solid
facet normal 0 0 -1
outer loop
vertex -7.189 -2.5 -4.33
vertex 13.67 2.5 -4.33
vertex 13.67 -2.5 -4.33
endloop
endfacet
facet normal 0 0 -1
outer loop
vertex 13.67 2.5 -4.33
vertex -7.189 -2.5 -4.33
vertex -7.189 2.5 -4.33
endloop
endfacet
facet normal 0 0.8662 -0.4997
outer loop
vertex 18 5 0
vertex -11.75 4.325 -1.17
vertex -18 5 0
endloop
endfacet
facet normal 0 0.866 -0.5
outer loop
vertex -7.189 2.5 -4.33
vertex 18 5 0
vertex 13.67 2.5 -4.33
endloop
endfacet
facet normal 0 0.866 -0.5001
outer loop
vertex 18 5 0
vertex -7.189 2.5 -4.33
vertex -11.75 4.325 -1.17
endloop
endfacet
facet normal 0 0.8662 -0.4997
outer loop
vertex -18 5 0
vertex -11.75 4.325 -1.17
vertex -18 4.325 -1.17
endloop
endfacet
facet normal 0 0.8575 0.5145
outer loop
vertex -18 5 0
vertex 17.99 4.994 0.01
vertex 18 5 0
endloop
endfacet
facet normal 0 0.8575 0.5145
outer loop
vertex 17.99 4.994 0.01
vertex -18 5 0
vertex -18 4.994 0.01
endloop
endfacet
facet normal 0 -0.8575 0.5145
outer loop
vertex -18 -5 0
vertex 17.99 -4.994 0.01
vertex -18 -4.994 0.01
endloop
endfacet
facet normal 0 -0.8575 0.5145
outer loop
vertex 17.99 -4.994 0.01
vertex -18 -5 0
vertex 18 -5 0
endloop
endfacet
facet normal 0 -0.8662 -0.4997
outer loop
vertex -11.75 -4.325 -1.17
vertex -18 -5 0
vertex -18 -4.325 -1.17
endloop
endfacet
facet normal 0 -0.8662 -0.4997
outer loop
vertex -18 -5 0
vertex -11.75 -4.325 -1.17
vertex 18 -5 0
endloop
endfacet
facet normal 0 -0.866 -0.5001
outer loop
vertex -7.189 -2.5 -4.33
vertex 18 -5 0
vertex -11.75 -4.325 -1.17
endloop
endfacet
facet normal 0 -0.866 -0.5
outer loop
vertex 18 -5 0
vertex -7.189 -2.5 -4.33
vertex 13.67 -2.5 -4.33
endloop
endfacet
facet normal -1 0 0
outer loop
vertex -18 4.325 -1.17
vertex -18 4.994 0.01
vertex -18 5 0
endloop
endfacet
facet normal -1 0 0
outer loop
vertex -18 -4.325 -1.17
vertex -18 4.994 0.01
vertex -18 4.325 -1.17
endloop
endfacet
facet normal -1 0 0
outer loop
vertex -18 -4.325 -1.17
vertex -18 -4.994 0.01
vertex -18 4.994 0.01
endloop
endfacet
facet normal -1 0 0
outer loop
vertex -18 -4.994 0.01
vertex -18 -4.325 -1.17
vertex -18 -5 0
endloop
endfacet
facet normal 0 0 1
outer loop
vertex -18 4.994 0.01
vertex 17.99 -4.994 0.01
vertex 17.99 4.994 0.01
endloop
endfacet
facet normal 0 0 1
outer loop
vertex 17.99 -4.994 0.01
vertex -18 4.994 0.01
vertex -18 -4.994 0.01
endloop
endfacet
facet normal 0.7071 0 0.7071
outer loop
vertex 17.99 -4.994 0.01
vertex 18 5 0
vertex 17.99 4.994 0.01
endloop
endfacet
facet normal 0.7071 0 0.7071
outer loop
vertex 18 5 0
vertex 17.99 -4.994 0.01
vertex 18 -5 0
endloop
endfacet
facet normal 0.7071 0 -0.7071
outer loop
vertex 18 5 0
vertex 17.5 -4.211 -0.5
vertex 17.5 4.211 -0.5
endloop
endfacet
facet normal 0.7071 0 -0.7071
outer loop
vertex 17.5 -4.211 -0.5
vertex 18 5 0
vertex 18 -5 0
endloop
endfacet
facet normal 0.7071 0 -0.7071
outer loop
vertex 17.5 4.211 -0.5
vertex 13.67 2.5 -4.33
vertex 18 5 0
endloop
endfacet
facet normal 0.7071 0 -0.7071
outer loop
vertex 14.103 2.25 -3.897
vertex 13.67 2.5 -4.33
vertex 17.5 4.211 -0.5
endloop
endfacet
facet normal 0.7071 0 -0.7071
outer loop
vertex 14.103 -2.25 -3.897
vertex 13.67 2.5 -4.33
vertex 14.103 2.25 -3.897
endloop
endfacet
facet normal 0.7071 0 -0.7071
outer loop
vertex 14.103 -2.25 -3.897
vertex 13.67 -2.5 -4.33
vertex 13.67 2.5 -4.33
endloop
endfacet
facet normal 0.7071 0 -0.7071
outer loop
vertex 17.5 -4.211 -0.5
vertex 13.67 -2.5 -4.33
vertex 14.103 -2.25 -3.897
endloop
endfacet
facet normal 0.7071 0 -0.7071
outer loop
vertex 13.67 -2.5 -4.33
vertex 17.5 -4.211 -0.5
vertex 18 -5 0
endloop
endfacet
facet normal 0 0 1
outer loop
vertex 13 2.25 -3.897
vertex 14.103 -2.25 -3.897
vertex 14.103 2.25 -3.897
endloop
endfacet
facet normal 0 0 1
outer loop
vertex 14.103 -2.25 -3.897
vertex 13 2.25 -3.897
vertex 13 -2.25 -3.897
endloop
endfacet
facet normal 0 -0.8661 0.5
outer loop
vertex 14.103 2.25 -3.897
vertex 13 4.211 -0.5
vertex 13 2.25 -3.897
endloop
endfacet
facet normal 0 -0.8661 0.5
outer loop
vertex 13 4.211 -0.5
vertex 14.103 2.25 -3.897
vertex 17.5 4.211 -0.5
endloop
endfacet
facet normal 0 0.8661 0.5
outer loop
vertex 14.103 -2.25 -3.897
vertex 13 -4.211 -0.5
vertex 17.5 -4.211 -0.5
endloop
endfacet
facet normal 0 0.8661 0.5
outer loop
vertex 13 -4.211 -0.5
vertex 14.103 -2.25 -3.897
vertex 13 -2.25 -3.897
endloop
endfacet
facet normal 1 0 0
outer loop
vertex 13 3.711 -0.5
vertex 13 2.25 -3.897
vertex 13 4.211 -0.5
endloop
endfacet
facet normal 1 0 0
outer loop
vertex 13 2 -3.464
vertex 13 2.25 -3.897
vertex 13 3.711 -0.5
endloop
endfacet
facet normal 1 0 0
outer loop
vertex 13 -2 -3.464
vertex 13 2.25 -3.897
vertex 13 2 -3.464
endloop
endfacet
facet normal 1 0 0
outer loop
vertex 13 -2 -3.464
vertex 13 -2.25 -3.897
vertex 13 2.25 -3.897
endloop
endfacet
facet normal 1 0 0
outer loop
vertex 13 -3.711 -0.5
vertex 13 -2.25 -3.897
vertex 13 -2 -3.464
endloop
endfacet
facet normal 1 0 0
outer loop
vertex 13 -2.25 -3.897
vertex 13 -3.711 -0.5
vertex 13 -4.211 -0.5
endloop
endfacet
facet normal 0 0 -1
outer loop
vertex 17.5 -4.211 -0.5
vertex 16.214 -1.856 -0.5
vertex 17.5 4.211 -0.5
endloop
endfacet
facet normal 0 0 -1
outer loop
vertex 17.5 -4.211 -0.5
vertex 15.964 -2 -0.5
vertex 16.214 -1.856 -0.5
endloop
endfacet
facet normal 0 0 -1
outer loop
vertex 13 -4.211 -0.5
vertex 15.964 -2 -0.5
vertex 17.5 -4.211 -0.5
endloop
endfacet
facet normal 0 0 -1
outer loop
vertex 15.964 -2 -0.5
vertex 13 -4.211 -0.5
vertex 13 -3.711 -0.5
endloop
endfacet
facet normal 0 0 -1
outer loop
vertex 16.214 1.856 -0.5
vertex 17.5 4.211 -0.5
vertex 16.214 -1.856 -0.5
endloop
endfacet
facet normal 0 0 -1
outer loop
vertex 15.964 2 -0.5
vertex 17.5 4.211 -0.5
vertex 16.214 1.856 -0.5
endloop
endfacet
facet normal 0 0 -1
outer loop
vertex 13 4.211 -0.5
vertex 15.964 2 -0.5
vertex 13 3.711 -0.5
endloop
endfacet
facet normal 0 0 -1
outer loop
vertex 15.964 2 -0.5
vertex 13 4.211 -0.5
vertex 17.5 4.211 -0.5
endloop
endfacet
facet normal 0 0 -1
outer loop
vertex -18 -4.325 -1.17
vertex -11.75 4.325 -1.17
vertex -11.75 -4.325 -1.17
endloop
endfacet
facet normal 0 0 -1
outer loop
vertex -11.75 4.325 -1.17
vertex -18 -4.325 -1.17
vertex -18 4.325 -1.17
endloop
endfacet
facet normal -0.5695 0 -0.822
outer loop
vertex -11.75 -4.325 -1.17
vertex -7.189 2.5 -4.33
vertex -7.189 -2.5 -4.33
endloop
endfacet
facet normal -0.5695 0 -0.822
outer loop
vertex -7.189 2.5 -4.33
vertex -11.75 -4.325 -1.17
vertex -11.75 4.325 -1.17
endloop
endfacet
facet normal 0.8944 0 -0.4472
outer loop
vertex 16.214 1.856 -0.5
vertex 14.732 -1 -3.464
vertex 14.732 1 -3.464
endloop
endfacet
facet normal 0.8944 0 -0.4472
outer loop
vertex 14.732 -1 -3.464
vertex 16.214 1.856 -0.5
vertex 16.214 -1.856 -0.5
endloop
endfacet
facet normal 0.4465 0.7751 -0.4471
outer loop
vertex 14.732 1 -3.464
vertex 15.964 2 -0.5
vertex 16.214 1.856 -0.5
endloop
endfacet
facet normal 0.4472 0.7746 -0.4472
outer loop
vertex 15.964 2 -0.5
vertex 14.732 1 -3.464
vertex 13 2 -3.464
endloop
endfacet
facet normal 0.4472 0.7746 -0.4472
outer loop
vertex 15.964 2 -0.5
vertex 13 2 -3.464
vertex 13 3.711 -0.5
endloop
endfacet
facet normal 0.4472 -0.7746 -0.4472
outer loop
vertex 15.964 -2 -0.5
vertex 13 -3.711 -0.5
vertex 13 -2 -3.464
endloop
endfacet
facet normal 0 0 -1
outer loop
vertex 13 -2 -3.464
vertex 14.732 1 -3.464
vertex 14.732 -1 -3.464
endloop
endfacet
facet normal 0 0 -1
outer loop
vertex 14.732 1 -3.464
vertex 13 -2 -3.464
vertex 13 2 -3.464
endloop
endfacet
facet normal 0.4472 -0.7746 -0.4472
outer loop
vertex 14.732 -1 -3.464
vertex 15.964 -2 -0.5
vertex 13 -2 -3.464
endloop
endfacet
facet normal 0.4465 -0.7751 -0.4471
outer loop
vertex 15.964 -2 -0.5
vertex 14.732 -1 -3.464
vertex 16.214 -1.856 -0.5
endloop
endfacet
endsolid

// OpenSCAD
// file: disk0.scad
use <../lib/util.scad>
include <common.scad>
use <disks.scad>

module disk_point_5_plus() {
    translate([0,0,disk_0_deck_h])
    cylinder(d1=(disk_0_upper_d+4*disk_0_deck_h), d2=disk_0_upper_d, h=disk_0_deck_h*2, center=true, $fn=faces_convex);

    linear_extrude(convexity=10, height=2*disk_0_deck_h, scale=[1,(disk_0_upper_d/ (disk_0_upper_d+4*disk_0_deck_h))])
    translate([-disk_0_width/4,0,0])
    square([disk_0_width/2, disk_0_upper_d+4*disk_0_deck_h], center=true);
    
    util_mirrored([0,1,0])
    translate([-disk_0_width/2, disk_0_upper_d/2 + disk_0_deck_h/2, disk_0_deck_h/2+.5])
    sphere(d=.8*disk_0_deck_h, $fn=faces_convex);
}

module disk_0_plus() {
    translate([0,0,disk_0_deck_h/2])
    cylinder(d1=disk_0_width, d2=(disk_0_width-2*disk_0_deck_h), h=disk_0_deck_h, center=true, $fn=faces_convex);

    disk_point_5_plus();
}

module disk_0_under() {
    difference() {
        translate([0,0,-disk_0_deck_h])
        cylinder(d2=(disk_0_upper_d+4*disk_0_deck_h), d1=disk_0_upper_d, h=disk_0_deck_h*2, center=true, $fn=faces_convex);
        
        translate([0,0,-2*disk_0_deck_h])
        cylinder(d2=disk_0_upper_d-2, d1=disk_0_upper_d, h=.5, center=true, $fn=faces_convex);
        
        util_repeat_rot(7, [0,0,45])
        translate([disk_0_upper_d/2+disk_0_deck_h,0,-disk_0_deck_h*.5]) porthole();
        
        util_repeat_rot(3, [0,0,90])
        translate([disk_0_upper_d/2,0,-disk_0_deck_h*1.5]) porthole();
    }
}

module disk_0_under_2() {
    difference() {
        translate([0,0,-disk_0_deck_h])
        cylinder(d2=disk_0_width, d1=(disk_0_width-4*disk_0_deck_h), h=disk_0_deck_h*2, center=true, $fn=faces_convex);
        
        translate([0,0,-2*disk_0_deck_h])
        cylinder(d2=disk_0_upper_d-2, d1=disk_0_upper_d, h=.5, center=true, $fn=faces_convex);
    }
}

module disk_point_5_minus() {
    translate([-disk_0_width/2,0,disk_0_deck_h])
    cube([.5, disk_0_upper_d-1, 2*disk_0_deck_h-1], center=true);
    
    util_mirrored([0,1,0])
    translate([-disk_0_width/2-.4*disk_0_deck_h, disk_0_upper_d/2 + disk_0_deck_h/2, disk_0_deck_h/2+.5])
    sphere(d=.6*disk_0_deck_h, $fn=faces_convex);
    
    translate([disk_0_upper_d/2+disk_0_deck_h/4, 0, disk_0_deck_h*1.5])
    scale([1,2,1])
    window();
    
    util_mirrored([0,1,0])
    util_repeat(3, [-4,0,0])
    rotate(90)
    translate([disk_0_upper_d/2+disk_0_deck_h/2, 0, disk_0_deck_h*1.5])
    porthole();
}

module disk_0_minus() {
    translate([0,0,2*disk_0_deck_h])
    cylinder(d1=disk_0_upper_d-2, d2=disk_0_upper_d, h=.5, center=true, $fn=faces_convex);
    
    disk_point_5_minus();
    
    util_mirrored([0,1,0])
    util_repeat_rot(6, [0,0,22])
    translate([disk_0_width/2-disk_0_deck_h/2,0, disk_0_deck_h*.5])
    porthole();
}

module disk_0() {
    difference() {
        disk_0_plus();
        disk_0_minus();
    }
}


module disk_point_5() {
    difference() {
        disk_point_5_plus();
        disk_point_5_minus();
    }
}

disk_0();
// file: disks.scad
use <../lib/util.scad>
include <common.scad>

module window() {
    translate([2,0,0])
    cube([5, 2, 1], center=true);
}

module porthole() {
    translate([2,0,0])
    rotate([0,90,0])
    cylinder(d=.75, h=5, center=true, $fn=12);
}
// file: common.scad
faces_convex=64;
faces_concave=128;
faces_rough=32;

disk_0_width=36;
disk_0_deck_h=2.5;
disk_0_upper_d=12;

disk_1_width=100;
disk_1_height=15;

class_0_nacelles_w=5;
class_0_nacelles_l=36;

class_0_secondary_w=10;
class_0_secondary_l=36;

class_0_hangar_l=50;

class_1_nacelle_w=9;
class_1_nacelle_l=115;

class_1_neck_w=10;
class_1_neck_w_2=1;

class_1_secondary_w=25;
class_1_secondary_l=100;

disk_2_width=240;
disk_2_height=30;
disk_2_deck=3;

class_2_nacelle_w=25;
class_2_nacelle_h=25;
class_2_nacelle_l=320;

class_2_secondary_w=60;
class_2_secondary_l=240;

disk_3_width=400;
disk_3_height=40;
disk_3_body_width=180;

class_3_secondary_w=80;
class_3_secondary_h=80;
class_3_secondary_l=400;

disk_4_width=750;
disk_4_upper=480;
disk_4_height=50;
disk_4_hangar_h=50;
disk_4_hangar_w=100;
disk_4_hangar_l=100;

class_3_nacelle_w=36;
class_3_nacelle_h=36;
class_3_nacelle_l=400;

class_4_body_w=750;
class_4_body_h=100;
class_4_body_h_extra=50;
class_4_body_curve=100;
class_4_body_upper_curve=10;
class_4_body_inner_curve=5;
class_4_body_wall=5;
class_4_body_height=135;
class_4_body_l=500;
class_4_body_hangar=100;
class_4_body_hangar_w=100;

class_4_nacelle_sep=145;
class_4_nacelle_disp=360;
class_4_nacelle_base_w=20;
class_4_nacelle_disp_ratio=1;

class_4_neck_curve=200;

class_4_hangar_h=90;
class_4_hangar_w=180;

class_4_nacelle_l=800;
class_4_nacelle_w=36;
class_4_nacelle_h=72;
// file: ../lib/util.scad
fn1 = 32;
fn2 = 16;

module util_half_sphere(radius, fn=fn1) {
    difference() {
        sphere(radius, $fn=fn);
        translate([0,0,-(radius+radius/19)])
            cube(2*radius+radius/10, center=true);
    }
}

function gcd(a,b) = a == b ? a : a > b ? gcd(a-b, b) : gcd(a, b-a);

module util_saucer(length, width, height, fn=fn1) {
    rad = gcd(length,gcd(width,height));
    //rad = 10;
    scale([length/(2*rad), width/(2*rad), height/rad])
        util_half_sphere(rad, fn);
}

module util_half_cylinder(length, radius, inner_fn=fn2, outer_fn=fn1) {
    maxval = max(length, 2*radius);
    intersection() {
        difference() {
            rotate([0,90,0])
                translate([0,0,-(length/2 + length/20)])
                    cylinder(length+length/10, radius, radius, $fn=inner_fn);
            
            translate([0,0,(maxval/2 + maxval/19)])
                cube(maxval+maxval/10, center=true);
        }
        
        translate([0,0,-(radius+radius/20)])
            cylinder(radius + radius/10, length/2, length/2, $fn=outer_fn);
    }
}

module util_body(length, width, height, upper_height, fn=fn1) {
    rad = gcd(length, gcd(width, upper_height));
    
    scale(.995) scale([length/(2*rad), width/(2*rad), 1])
        util_half_cylinder(2*rad, height, outer_fn=fn);
}

module util_graded_cylinder(height, radius_start, radius_end, grades=1, fn=fn1) {
    height_grade = height / grades;
    radius_grade = (radius_start - radius_end) / (grades * grades);
    for (i = [0 : 1 : grades]) {
        translate([0,0,i*height_grade])
            cylinder(height_grade, 
                     radius_start - i*radius_grade * i,
                     radius_start - (i+1) * radius_grade * (i+1),
                     $fn = fn);
    }
}

module util_nacelle(length, width, height, curved=false, up=true, front_bulge=false) {
    rad = min(width, height/2);
    grads = curved ? 6 : 1;
    scale_factor = front_bulge ? 1.1 : 1;
    direction = up ? -1 : 1;
    difference() {
        scale([1, width/ (2*rad), height/rad])
            difference() {
                union() {
                    rotate([0,-90,0])
                        rotate(30)
                            util_graded_cylinder(length-rad, rad, rad/2, grads, 6);
                    scale(scale_factor) 
                        rotate([0,90,0]) rotate(90) sphere(rad, $fn=6);
                }
                
                translate([-length/2, 0, direction * (height/2 + height/19)])
                    cube([length+length, width+width, height+height/10], center=true);
            }
        
        translate([-length-(curved?length/3:0), 0, -length/3])
            rotate([0,-45,0])
                cube(length, center=true);
    }
}

module util_mirrored(v) {
    children();
    mirror(v) children();
}

module util_ring(outer, inner, height, fn=fn1) {
    difference() {
        translate([0,0,-height/2])
            cylinder(height, outer, outer, $fn=fn);
        translate([0,0,-(height/2 + height/19)])
            cylinder(height+height/10, inner, inner, $fn=fn);
    }
}

module util_star(radius, thick, num, half=false) {
    angle = 360/num;
    offset = half? angle/2 : 0;
    for (i = [0: 1: num]) {
        rotate(i* angle + offset)
            translate([radius/2,0,0])
                cube([radius, thick, thick], center=true);
    }
}

module util_ring_star(radius, thick, num, inner, half=false) {
    outer=inner+thick;
    avg = (inner + outer)/2;
    union() {
        difference() {
            util_star(radius, thick, num, half);
            cylinder(2*thick, outer, outer, $fn=num, center=true);
        }
        util_ring(outer, inner, thick);
    }
}

module util_hangar_disk(height, lower, upper, num, fn=fn1) {
    difference() {
            cylinder(height, lower, upper, $fn=fn, center=true);
        difference() {
            scale([1,1,22])
                util_star(1.1*upper, height/20, num, half=true);
            scale(.95)
                cylinder(height, lower, upper, $fn=fn, center=true);
        }
    }
}

module util_hangar_form(length, width, height, num, inner=0) {
    l = 0.6* max(length, width);
    h = 2.5* height;
    thick = min(height/20,1);
    inner = inner == 0 ? l/3 : inner;
    difference() {
        children();
        scale([1,1,h/thick]) 
            util_ring_star(l, thick, num, inner, half=true);
    }
    scale(.95) children();
}

module util_nacelle_bar(span, height, width, thickness, faces=fn1) {
    rad = (span*span/(8*height) + height/2);
    outer = rad + thickness/2;
    inner = rad - thickness/2;
    difference(){
        translate([0,0,outer])
            rotate([0,90,0])
                util_ring(outer, inner, width, fn=faces);
    
        translate([0,0,1.1*outer+height])
            cube(2.2*outer, center=true);
    }
}

module util_q_sphere(rad, quadrant, faces) {
    x_sign = quadrant == 1 ? 1 :
             quadrant == 2 ? -1 :
             quadrant == 3 ? -1 :
             quadrant == 4 ? 1 : 0;
    z_sign = quadrant == 1 ? 1 :
             quadrant == 2 ? 1 :
             quadrant == 3 ? -1 :
             quadrant == 4 ? -1 : 0;
    
    difference() {
        sphere(rad, $fn=faces);

        translate([x_sign*(-1.1*rad - .01),0,0])
        cube(2.2*rad, center=true);

        translate([0,0,z_sign*(-1.1*rad - .01)])
        cube(2.2*rad, center=true);
    }
}

module util_ovoid(front_rad, back_rad, width, upper_rad, lower_rad, faces=32) {
    half_width = width/2;
    largest=max(front_rad, back_rad, half_width, upper_rad, lower_rad);
    smallest=min(front_rad, back_rad, half_width, upper_rad, lower_rad);
    
    union() {
        scale([front_rad/smallest, half_width/smallest, upper_rad/smallest])
        util_q_sphere(smallest, 1, faces);
        
        scale([front_rad/smallest, half_width/smallest, lower_rad/smallest])
        util_q_sphere(smallest, 4, faces);
        
        scale([back_rad/smallest, half_width/smallest, lower_rad/smallest])
        util_q_sphere(smallest, 3, faces);
        
        scale([back_rad/smallest, half_width/smallest, upper_rad/smallest])
        util_q_sphere(smallest, 2, faces);
    }
}

module util_saucer_shape(width, height, height_ext, depth, depth_ext) {
    difference() {
        util_ovoid(width/2,
                   width/2,
                   width,
                   height+height_ext,
                   depth+depth_ext);
        
        if (height_ext > 0) {
            translate([0,0,width/2 + height])
            cube(width, center=true);
        }
        
        if (depth_ext > 0) {
            translate([0,0,-width/2 - depth])
            cube(width, center=true);
        }
    }
}

module util_repeat(times, vector) {
    x = vector[0];
    y = vector[1];
    z = vector[2];
    for(i=[0:times]) {
        translate([i*x, i*y, i*z])
        children();
    }
}

module util_repeat_rot(times, rot_vector) {
    x = rot_vector[0];
    y = rot_vector[1];
    z = rot_vector[2];
    for(i=[0:times]) {
        rotate([i*x, i*y, i*z])
        children();
    }
}
// main file
use <../lib/util.scad>
include <common.scad>
use <disks.scad>
use <disk0.scad>

module class_0_nacelle() {
    intersection() {
        translate([class_0_nacelles_l/4,0,0])
        scale([2*class_0_nacelles_l/class_0_nacelles_w,1,1])
        sphere(d=class_0_nacelles_w, $fn=faces_convex);

        translate([-class_0_nacelles_l/8,0,0])
        cube(class_0_nacelles_l, center=true);
    }

    translate([class_0_nacelles_l/2-class_0_nacelles_l/8,0,0])
    sphere(d=class_0_nacelles_w*.8, $fn=faces_convex);
}

module class_0_attack_engine() {
    class_0_secondary();
    translate([-class_0_nacelles_l*.75,0,0])
    class_0_double_nacelle();
}


module class_0_double_nacelle() {
    difference() {
        union() {
            util_mirrored([0,1,0])
            translate([0,class_0_nacelles_w/2,0])
            class_0_nacelle();

            intersection() {
                translate([class_0_nacelles_l/4,0,0])
                scale([2*class_0_nacelles_l/class_0_nacelles_w,1,1])
                rotate([90,0,0])
                cylinder(d=class_0_nacelles_w, h=class_0_nacelles_w, $fn=faces_convex, center=true);

                translate([-class_0_nacelles_l/8,0,0])
                cube(class_0_nacelles_l, center=true);
            }
        }
        
        translate([-class_0_nacelles_l*5/8,0,0])
        rotate([90,0,0])
        cylinder(d=1,h=class_0_nacelles_w, center=true, $fn=faces_rough);
    }
}

module class_0_hangars() {
    difference() {
        union() {
            translate([0,0,disk_0_deck_h])
            cylinder(d1=(disk_0_upper_d+2*disk_0_deck_h), d2=disk_0_upper_d, h=disk_0_deck_h*2, center=true, $fn=faces_convex);

            linear_extrude(convexity=10, height=2*disk_0_deck_h, scale=[1,(disk_0_upper_d/ (disk_0_upper_d+2*disk_0_deck_h))])
            translate([-class_0_hangar_l/2,0,0])
            square([class_0_hangar_l, disk_0_upper_d+2*disk_0_deck_h], center=true);

            translate([-class_0_hangar_l,0,disk_0_deck_h])
            cylinder(d1=(disk_0_upper_d+2*disk_0_deck_h), d2=disk_0_upper_d, h=disk_0_deck_h*2, center=true, $fn=faces_convex);

            scale([1,1,.25]) {
                sphere(d=disk_0_upper_d+2*disk_0_deck_h, $fn=faces_convex);

                rotate([0,-90,0])
                translate([0,0,class_0_hangar_l/2])
                cylinder(d=disk_0_upper_d+2*disk_0_deck_h, h=class_0_hangar_l, center=true, $fn=faces_convex);

                translate([-class_0_hangar_l,0,0])
                sphere(d=disk_0_upper_d+2*disk_0_deck_h, $fn=faces_convex);
            }
        }

        translate([disk_0_upper_d+.1,0,disk_0_deck_h])
        cube([2*disk_0_upper_d, 2*disk_0_upper_d, 4], center=true);

        translate([-disk_0_upper_d-class_0_hangar_l-.1,0,disk_0_deck_h])
        cube([2*disk_0_upper_d, 2*disk_0_upper_d, 4], center=true);
    }

    translate([0,0,disk_0_deck_h])
    cylinder(d1=(disk_0_upper_d+2*disk_0_deck_h-1), d2=disk_0_upper_d-.5, h=disk_0_deck_h*2-1, center=true, $fn=faces_rough);

    translate([-class_0_hangar_l,0,disk_0_deck_h])
    cylinder(d1=(disk_0_upper_d+2*disk_0_deck_h-1), d2=disk_0_upper_d-.5, h=disk_0_deck_h*2-1, center=true, $fn=faces_rough);
}

module class_0_secondary() {
    difference(){
        intersection() {
            rotate([0,90,0])
            rotate(90)
            cylinder(d=class_0_secondary_w, h=class_0_secondary_l, $fn=6, center=true);

            translate([0,0,-class_0_secondary_l*.75+.01])
            cube(class_0_secondary_l*1.5, center=true);
            
            translate([class_0_secondary_l/2,0,0])
            rotate([0,45,0])
            translate([-class_0_secondary_l*.75,0,-class_0_secondary_l*.75])
            cube(class_0_secondary_l*1.5, center=true);
        }
        
        translate([class_0_secondary_l/2,0,0])
        translate([-class_0_secondary_w/4,0,0])
        intersection() {
            rotate([0,90,0])
            rotate(90)
            cylinder(d=class_0_secondary_w-1, h=class_0_secondary_w/2, center=true, $fn=6);

            translate([0,0,-class_0_secondary_w*.75-.5])
            cube(class_0_secondary_w*1.5, center=true);
        }
        
        translate([-class_0_secondary_l/2,0,-class_0_secondary_w/2-.5])
        scale([2.5,1,1])
        rotate([90,0,0])
        cylinder(d=class_0_secondary_w, h=class_0_secondary_w*2, center=true, $fn=6);
    }

    translate([class_0_secondary_l/2-class_0_secondary_w/2,0,0])
    intersection() {
        rotate(90)
        sphere(d=class_0_secondary_w-2, $fn=6);
        
        translate([0,0,-class_0_secondary_w/2-.05])
        cube(class_0_secondary_w, center=true);
    }
}


module class_0_habitat() {
    difference() {
        intersection() {
            scale([5,1,1])
            sphere(d=disk_0_upper_d, $fn=faces_convex);
            
            cube(disk_0_width, center=true);
        }
        
        util_mirrored([0,1,0])
        util_mirrored([0,0,1])
        util_mirrored([1,0,0]) {
            util_repeat(2, [-6,0,0])
            translate([0, disk_0_upper_d/2-1, 1.5])
            rotate(90)
            porthole();
            
            util_repeat(1, [-6,0,0])
            translate([0, disk_0_upper_d/2-2.5, 4.5])
            rotate(90)
            porthole();
        }
    }
    
    difference() {
        rotate([0,90,0])
        cylinder(d=disk_0_upper_d*.7, h=disk_0_width+1, center=true, $fn=faces_convex);
        
        util_mirrored([1,0,0]) {
            translate([disk_0_width/2+.75, 0, 1.5])
            window();
            
            util_mirrored([0,1,0])
            translate([disk_0_width/2+.75, .75, -1.5])
            porthole();
        }
    }
    
    translate([disk_1_height*.75,0,disk_1_height*.5/2])
    cylinder(d1=disk_0_upper_d*.75, d2=disk_0_upper_d*.3, h=disk_1_height*.5, center=true, $fn=faces_convex);
    
        translate([-disk_1_height*.75,0,disk_1_height*.25])
    cylinder(d1=disk_0_upper_d*.75, d2=disk_0_upper_d*.3, h=disk_1_height*.5, center=true, $fn=faces_convex);
}

class_0_secondary();
